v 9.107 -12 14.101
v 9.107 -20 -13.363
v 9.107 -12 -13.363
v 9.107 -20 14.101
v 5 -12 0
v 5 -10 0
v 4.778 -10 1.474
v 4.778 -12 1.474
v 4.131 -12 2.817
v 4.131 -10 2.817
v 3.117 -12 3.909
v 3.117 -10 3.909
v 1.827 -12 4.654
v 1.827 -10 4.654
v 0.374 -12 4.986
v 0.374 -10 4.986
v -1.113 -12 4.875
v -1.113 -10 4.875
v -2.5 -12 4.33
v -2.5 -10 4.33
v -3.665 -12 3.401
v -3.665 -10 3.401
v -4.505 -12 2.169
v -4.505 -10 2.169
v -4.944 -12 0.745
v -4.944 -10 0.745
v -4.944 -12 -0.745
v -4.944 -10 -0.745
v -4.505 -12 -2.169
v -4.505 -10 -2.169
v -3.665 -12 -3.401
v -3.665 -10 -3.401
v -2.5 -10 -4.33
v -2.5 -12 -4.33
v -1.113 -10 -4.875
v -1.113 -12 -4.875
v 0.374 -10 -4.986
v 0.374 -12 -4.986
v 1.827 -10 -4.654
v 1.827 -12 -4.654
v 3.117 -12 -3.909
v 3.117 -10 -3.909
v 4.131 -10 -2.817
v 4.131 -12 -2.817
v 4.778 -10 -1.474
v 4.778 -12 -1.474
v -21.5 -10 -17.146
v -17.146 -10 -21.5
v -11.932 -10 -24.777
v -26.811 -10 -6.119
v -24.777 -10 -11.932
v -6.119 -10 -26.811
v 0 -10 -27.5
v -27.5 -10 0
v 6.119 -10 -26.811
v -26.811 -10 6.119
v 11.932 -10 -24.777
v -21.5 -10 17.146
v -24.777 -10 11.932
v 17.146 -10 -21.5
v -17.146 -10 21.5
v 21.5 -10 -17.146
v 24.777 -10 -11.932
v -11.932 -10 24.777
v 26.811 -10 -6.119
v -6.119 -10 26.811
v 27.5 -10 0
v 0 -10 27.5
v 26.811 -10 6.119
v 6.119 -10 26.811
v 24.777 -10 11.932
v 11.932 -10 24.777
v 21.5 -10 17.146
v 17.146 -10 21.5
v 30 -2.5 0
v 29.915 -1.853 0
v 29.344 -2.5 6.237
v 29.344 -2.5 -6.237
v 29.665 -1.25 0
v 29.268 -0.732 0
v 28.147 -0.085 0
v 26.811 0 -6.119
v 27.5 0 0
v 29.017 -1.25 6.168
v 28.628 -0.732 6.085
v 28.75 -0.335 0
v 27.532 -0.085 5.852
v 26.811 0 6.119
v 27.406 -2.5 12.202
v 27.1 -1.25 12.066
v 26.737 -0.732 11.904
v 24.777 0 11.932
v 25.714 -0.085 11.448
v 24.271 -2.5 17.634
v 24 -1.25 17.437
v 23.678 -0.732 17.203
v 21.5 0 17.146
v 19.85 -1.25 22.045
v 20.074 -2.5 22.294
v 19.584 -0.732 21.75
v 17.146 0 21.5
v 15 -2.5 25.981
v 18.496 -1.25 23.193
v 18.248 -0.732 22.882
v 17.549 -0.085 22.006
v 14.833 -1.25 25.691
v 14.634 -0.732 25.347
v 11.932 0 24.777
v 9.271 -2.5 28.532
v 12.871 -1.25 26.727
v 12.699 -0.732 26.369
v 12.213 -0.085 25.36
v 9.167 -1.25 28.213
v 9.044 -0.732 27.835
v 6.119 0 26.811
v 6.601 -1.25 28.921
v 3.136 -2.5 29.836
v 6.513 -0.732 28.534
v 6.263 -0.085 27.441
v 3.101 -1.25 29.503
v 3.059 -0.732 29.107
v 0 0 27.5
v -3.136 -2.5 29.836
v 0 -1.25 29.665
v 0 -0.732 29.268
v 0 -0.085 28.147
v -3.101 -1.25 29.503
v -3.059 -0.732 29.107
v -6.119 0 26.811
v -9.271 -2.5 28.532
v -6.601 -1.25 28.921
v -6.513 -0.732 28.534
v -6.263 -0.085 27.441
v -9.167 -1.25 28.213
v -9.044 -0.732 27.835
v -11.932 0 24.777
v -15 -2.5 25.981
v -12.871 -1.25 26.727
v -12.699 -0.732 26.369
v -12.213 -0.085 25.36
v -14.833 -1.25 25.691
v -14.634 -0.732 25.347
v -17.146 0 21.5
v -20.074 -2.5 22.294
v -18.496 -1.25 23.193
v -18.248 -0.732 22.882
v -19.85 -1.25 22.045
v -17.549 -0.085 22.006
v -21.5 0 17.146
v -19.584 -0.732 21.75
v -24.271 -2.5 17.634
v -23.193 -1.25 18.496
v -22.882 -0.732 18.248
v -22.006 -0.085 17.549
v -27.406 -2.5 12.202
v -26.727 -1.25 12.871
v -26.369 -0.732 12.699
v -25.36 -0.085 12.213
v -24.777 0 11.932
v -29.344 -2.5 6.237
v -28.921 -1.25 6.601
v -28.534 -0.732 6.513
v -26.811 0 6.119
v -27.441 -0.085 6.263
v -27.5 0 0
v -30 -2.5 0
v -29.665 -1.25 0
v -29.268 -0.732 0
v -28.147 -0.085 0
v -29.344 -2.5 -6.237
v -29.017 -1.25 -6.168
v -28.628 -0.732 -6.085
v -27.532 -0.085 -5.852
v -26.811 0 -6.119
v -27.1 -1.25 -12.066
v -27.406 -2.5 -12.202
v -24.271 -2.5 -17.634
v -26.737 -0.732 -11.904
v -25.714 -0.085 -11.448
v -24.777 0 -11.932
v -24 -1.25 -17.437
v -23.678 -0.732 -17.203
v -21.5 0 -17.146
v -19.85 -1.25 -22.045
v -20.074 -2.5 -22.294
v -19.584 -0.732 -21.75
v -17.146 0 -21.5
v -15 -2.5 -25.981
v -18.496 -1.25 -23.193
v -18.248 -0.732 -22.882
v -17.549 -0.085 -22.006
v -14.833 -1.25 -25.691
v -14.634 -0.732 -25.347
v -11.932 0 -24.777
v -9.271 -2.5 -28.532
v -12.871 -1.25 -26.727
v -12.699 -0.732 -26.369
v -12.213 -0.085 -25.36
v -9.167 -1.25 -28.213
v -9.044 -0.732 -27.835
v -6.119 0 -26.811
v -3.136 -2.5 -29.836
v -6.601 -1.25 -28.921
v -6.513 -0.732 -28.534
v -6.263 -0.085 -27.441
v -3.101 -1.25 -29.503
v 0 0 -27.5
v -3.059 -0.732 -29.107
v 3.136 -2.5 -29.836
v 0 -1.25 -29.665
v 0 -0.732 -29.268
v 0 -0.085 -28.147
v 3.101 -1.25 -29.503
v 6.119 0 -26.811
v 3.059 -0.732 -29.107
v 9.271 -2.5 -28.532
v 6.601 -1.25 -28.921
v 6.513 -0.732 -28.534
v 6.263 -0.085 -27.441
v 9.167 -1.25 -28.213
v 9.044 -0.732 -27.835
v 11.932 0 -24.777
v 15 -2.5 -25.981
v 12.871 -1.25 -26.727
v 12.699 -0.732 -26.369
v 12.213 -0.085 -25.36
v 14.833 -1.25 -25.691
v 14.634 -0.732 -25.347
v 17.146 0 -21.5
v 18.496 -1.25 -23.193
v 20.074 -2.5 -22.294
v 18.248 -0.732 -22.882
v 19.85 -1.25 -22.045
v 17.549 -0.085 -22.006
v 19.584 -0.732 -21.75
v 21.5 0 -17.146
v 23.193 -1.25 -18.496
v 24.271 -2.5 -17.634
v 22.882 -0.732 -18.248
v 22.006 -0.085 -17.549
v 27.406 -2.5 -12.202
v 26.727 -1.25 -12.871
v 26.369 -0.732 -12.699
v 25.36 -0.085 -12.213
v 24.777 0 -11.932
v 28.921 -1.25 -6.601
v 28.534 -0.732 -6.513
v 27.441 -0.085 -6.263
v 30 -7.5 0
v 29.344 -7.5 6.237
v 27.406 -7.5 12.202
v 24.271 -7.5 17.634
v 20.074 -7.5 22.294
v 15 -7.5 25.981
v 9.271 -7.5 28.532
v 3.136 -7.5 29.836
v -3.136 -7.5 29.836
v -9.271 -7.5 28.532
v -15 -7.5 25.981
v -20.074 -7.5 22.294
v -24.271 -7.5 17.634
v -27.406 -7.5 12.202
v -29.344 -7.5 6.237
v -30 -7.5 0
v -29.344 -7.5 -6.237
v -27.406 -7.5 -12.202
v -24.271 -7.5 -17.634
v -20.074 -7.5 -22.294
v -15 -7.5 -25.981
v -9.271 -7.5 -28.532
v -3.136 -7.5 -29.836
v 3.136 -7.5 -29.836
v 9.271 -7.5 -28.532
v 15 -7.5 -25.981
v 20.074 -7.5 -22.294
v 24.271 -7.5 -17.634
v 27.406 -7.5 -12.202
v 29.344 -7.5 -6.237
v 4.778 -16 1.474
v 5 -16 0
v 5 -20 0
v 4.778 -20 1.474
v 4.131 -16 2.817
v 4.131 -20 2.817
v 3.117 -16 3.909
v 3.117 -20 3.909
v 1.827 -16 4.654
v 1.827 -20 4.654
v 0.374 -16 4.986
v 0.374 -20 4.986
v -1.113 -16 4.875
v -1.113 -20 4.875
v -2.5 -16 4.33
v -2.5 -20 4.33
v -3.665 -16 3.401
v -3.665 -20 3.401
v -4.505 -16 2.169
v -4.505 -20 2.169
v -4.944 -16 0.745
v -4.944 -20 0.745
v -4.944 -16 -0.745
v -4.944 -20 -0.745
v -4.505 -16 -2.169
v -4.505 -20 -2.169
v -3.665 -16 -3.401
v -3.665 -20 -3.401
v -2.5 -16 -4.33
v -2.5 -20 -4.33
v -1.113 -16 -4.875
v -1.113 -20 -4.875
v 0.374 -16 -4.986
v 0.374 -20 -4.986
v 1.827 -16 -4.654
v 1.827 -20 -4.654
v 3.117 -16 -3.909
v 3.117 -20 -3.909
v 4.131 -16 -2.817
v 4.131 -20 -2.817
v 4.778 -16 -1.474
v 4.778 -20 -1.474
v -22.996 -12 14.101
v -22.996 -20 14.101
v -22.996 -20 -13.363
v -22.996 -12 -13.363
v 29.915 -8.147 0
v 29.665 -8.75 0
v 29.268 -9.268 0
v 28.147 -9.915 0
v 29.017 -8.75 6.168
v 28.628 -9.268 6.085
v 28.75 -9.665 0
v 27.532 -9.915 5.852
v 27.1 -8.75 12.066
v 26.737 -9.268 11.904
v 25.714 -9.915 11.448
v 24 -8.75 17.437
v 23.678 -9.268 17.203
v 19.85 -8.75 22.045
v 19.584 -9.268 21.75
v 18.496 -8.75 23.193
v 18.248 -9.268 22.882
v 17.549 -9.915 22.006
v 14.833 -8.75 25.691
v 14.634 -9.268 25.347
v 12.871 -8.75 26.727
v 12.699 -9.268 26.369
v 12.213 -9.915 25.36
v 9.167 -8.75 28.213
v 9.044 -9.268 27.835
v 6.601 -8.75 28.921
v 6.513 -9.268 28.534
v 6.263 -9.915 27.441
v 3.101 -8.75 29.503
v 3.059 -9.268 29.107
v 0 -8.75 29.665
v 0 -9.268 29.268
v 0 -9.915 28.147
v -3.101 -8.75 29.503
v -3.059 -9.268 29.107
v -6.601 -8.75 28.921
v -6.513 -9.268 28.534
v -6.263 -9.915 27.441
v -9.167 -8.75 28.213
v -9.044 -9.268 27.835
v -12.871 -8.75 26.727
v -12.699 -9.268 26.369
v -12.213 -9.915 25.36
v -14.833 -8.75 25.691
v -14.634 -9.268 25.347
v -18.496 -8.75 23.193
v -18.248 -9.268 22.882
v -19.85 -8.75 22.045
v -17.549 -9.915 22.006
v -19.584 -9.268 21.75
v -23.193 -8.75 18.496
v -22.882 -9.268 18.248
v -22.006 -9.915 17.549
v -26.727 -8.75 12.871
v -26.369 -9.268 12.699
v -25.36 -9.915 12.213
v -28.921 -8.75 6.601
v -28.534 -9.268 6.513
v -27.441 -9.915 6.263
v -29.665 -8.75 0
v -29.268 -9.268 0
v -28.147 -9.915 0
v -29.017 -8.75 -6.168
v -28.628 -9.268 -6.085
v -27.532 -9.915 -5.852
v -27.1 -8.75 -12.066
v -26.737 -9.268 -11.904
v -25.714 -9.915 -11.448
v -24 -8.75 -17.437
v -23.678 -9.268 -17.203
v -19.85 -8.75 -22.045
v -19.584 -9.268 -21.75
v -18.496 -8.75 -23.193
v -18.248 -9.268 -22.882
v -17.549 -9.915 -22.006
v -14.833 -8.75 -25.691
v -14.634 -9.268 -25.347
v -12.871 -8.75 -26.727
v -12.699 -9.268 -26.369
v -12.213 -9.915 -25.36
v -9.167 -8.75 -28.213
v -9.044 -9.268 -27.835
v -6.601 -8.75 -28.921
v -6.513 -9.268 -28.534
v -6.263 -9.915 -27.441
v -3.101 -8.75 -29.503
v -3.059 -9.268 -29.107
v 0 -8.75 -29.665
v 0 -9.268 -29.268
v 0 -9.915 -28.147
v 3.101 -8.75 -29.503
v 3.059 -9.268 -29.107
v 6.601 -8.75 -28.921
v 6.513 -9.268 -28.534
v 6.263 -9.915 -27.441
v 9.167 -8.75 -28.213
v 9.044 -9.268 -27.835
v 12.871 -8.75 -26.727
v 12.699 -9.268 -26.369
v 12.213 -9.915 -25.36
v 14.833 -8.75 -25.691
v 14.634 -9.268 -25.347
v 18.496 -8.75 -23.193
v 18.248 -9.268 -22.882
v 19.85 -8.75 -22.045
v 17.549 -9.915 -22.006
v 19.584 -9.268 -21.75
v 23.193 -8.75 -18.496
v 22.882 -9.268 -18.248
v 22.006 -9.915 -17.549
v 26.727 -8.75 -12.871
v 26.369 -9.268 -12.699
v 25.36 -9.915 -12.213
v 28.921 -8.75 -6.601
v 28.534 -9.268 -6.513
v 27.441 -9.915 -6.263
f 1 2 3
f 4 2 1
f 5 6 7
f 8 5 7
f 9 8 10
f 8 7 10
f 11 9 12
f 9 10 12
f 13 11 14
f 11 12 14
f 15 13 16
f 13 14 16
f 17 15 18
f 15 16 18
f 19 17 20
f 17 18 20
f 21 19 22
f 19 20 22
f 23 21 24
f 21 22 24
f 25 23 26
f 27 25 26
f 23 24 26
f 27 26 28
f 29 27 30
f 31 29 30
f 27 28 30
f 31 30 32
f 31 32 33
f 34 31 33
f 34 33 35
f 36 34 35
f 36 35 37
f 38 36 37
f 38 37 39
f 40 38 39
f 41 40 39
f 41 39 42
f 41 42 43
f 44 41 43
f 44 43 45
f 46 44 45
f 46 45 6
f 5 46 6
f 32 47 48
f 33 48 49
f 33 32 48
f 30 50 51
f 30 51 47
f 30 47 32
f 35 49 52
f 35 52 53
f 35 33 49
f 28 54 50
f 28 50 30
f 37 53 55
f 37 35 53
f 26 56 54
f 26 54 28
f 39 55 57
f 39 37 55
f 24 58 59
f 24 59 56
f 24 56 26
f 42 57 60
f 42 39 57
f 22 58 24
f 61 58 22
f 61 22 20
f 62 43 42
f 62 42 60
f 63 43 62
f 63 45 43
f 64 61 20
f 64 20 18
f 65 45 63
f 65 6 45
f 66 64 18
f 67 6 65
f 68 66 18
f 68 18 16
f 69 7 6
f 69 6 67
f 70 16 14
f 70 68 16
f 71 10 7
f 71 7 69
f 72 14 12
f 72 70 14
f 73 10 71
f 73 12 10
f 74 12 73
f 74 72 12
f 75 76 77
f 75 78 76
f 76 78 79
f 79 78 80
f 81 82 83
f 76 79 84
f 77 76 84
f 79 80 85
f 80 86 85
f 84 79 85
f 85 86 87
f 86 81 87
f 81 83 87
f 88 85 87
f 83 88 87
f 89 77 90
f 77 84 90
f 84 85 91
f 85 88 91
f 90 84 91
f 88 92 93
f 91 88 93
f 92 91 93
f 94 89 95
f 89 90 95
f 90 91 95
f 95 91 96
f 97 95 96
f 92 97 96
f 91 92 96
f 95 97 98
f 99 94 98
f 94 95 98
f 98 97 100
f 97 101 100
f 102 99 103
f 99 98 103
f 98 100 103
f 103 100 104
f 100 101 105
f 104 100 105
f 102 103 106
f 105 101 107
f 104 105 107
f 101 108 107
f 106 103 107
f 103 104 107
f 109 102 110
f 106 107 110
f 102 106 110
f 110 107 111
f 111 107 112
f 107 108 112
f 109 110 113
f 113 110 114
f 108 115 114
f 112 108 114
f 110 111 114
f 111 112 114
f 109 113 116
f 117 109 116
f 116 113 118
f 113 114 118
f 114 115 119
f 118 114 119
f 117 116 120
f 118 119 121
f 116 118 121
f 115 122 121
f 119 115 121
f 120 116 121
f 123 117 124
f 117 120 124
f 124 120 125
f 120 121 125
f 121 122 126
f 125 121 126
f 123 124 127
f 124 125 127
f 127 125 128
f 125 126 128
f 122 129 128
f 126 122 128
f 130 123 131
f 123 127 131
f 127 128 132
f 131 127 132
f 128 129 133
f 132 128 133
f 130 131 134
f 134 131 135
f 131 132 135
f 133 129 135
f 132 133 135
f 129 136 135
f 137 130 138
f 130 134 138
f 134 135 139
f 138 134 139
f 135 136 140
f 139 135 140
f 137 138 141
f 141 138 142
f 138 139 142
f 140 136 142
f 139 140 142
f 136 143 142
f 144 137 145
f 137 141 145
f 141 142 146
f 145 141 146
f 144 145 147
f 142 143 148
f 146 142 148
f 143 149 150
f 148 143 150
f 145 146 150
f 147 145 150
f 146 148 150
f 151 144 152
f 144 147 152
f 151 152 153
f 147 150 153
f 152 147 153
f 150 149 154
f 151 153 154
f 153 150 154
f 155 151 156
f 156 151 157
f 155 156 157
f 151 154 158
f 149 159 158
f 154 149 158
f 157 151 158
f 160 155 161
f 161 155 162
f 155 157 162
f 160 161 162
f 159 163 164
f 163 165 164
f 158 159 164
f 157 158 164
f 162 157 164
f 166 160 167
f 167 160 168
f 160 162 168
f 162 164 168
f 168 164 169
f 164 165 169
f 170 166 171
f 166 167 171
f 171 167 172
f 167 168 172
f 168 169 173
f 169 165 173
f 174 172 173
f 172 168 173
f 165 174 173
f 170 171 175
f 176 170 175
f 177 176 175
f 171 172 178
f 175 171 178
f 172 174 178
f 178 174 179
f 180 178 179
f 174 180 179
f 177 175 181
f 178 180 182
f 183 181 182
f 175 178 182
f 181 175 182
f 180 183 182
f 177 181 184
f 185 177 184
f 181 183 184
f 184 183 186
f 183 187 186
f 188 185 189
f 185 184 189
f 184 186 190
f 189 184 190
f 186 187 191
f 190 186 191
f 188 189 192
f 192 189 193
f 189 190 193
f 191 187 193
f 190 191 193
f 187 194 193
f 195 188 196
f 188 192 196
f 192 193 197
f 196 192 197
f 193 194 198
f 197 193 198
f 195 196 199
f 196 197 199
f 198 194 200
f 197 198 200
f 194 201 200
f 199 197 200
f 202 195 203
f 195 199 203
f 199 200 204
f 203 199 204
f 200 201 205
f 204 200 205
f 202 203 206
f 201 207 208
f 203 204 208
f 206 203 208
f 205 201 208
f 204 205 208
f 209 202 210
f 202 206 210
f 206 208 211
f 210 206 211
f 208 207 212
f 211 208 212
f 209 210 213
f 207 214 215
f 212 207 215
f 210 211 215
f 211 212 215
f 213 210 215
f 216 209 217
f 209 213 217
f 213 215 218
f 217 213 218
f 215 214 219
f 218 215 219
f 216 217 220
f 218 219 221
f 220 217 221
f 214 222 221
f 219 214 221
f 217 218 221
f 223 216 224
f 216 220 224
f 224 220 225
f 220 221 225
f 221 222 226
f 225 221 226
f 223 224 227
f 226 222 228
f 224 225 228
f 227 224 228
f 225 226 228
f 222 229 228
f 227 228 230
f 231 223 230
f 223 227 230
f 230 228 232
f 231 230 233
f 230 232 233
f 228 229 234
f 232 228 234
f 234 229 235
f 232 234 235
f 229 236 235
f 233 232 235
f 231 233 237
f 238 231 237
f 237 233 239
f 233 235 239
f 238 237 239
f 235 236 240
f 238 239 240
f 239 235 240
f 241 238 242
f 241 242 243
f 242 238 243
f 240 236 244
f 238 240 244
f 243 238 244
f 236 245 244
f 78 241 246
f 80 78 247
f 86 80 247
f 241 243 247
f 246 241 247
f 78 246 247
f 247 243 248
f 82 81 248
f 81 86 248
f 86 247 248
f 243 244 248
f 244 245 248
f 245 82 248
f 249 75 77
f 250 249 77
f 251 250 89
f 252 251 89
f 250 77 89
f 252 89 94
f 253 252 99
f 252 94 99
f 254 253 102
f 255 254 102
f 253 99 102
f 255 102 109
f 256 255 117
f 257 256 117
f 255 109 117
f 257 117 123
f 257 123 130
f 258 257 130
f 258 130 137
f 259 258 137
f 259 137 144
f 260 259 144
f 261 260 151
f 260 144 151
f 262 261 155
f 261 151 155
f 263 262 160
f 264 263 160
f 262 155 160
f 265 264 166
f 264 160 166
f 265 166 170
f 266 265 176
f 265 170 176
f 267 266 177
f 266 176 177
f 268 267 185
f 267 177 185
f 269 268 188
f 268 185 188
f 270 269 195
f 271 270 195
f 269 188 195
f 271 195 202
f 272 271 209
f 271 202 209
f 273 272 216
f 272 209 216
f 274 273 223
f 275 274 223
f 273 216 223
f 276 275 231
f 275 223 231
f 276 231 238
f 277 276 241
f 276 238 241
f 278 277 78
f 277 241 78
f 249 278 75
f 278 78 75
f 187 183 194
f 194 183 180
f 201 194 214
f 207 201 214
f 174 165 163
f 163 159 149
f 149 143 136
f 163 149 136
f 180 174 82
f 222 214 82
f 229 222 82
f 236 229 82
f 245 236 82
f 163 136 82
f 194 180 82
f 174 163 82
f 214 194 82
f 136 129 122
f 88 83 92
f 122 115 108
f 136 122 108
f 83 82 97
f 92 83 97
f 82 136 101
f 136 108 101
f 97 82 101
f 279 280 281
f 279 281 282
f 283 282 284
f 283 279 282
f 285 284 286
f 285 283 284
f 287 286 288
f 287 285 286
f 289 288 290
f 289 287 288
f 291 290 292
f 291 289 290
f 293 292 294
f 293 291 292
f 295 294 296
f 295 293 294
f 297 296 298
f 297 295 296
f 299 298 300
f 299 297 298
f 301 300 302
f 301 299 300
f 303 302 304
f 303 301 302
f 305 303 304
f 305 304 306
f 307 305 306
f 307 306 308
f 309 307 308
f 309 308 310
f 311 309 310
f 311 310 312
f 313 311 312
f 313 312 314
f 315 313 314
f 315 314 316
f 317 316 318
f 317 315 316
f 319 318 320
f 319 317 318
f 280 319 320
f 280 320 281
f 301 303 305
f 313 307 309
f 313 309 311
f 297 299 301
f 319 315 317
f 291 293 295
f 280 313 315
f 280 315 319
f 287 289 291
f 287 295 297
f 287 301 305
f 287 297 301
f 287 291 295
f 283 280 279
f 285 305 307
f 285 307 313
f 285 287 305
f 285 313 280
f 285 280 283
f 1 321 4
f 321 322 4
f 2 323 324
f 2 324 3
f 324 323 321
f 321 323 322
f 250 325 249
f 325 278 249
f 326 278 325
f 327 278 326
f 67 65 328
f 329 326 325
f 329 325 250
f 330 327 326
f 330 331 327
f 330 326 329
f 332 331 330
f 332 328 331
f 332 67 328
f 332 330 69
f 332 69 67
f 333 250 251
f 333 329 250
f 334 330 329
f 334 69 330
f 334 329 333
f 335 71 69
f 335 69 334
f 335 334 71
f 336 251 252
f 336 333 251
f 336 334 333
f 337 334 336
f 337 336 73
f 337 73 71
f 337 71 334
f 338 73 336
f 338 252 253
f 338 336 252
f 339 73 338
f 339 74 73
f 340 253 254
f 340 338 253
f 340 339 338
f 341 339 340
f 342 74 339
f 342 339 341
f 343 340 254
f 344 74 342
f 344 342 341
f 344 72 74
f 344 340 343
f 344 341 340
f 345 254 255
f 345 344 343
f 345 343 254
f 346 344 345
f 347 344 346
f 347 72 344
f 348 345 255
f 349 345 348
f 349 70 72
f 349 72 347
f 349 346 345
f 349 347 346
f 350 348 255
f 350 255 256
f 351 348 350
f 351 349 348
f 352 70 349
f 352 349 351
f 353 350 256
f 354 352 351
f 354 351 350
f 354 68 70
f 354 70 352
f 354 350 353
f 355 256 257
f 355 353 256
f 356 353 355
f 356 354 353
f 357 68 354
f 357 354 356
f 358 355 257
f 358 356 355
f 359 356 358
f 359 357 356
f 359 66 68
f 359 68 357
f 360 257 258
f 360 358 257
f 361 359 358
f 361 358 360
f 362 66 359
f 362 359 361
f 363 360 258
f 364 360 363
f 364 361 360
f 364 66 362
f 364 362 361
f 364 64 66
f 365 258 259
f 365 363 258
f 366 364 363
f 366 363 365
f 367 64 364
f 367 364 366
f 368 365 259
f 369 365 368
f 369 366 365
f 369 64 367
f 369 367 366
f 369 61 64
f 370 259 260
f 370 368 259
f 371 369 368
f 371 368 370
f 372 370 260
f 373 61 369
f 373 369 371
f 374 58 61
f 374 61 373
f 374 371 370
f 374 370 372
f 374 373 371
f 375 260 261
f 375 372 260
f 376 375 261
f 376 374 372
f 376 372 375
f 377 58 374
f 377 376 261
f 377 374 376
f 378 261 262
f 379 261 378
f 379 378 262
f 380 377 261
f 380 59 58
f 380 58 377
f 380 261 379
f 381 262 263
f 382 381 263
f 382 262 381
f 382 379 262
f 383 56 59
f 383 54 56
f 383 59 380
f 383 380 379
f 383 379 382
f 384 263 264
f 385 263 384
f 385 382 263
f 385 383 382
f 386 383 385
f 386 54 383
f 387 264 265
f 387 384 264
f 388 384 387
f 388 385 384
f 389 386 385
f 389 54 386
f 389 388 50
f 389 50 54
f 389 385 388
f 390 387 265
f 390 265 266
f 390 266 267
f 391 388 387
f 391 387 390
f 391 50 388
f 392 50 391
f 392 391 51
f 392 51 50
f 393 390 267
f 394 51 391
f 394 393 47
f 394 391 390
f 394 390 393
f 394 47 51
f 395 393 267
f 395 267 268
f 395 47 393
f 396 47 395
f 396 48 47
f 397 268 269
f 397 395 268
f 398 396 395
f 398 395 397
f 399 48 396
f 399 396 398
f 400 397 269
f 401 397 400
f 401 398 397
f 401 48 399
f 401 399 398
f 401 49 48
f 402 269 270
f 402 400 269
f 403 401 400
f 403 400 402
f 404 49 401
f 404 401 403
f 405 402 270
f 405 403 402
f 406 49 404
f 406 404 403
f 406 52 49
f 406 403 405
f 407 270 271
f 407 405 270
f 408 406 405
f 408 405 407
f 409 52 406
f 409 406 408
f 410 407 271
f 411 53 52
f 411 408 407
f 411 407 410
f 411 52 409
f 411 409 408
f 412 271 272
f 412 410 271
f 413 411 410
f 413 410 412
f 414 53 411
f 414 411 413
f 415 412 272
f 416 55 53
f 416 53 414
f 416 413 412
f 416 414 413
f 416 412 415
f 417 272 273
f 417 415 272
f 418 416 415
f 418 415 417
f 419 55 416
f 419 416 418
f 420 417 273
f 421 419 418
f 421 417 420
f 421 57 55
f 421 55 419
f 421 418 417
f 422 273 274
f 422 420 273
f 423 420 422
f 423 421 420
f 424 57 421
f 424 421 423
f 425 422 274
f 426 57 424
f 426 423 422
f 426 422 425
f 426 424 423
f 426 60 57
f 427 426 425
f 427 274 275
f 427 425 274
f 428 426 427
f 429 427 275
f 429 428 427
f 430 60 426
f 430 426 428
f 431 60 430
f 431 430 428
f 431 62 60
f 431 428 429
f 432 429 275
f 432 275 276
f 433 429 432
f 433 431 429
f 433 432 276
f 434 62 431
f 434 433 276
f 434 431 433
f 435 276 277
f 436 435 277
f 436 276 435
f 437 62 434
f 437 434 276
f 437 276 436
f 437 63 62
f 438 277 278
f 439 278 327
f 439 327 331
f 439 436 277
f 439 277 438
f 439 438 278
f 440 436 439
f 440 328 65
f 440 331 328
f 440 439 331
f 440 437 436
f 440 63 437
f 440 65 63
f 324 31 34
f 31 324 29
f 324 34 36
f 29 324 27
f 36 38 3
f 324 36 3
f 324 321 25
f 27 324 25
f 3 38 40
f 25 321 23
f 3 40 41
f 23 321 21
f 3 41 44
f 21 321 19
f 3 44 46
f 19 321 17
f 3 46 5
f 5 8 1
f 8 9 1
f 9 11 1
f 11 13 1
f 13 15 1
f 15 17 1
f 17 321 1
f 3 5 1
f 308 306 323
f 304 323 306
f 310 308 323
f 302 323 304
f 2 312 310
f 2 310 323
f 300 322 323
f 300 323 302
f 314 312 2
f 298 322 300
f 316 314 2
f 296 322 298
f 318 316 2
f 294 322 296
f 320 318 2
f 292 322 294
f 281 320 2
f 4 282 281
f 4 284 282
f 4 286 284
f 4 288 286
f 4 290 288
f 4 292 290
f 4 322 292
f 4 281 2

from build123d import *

# Parameters (mm, degrees)
F0_R     = 30
F1_DEPTH = 10
F2_R     = 2.5
F3_R     = 2.5
F4_R     = 5
F5_DEPTH = 6
F6_W     = 32.103093341
F6_H     = 27.4639837444
F6_R     = 5
F7_DEPTH = 4


with BuildPart() as f1:
    # F0 (on Front) → F1 (new body)
    with BuildSketch(Plane.XZ):
        Circle(F0_R)
    extrude(amount=F1_DEPTH)

    # F2
    f2_edges = [f1.edges().sort_by_distance(p)[0] for p in [
        (-30, -10, 0),
    ]]
    fillet(f2_edges, radius=F2_R)

    # F3
    f3_edges = [f1.edges().sort_by_distance(p)[0] for p in [
        (-30, 0, 0),
        (-27.5, -10, 0),
    ]]
    fillet(f3_edges, radius=F3_R)

    # F4 (on face) → F5 (join)
    with BuildSketch(Plane.XZ.offset(10)):
        Circle(F4_R)
    extrude(amount=F5_DEPTH)

    # F6 (on face) → F7 (join, symmetric)
    with BuildSketch(Plane.XZ.offset(16)):
        with Locations((-6.9443220273, 0.3692498431)):
            Rectangle(F6_W, F6_H)
        Circle(F6_R, mode=Mode.SUBTRACT)
    extrude(amount=F7_DEPTH, both=True)


solid = f1.part
